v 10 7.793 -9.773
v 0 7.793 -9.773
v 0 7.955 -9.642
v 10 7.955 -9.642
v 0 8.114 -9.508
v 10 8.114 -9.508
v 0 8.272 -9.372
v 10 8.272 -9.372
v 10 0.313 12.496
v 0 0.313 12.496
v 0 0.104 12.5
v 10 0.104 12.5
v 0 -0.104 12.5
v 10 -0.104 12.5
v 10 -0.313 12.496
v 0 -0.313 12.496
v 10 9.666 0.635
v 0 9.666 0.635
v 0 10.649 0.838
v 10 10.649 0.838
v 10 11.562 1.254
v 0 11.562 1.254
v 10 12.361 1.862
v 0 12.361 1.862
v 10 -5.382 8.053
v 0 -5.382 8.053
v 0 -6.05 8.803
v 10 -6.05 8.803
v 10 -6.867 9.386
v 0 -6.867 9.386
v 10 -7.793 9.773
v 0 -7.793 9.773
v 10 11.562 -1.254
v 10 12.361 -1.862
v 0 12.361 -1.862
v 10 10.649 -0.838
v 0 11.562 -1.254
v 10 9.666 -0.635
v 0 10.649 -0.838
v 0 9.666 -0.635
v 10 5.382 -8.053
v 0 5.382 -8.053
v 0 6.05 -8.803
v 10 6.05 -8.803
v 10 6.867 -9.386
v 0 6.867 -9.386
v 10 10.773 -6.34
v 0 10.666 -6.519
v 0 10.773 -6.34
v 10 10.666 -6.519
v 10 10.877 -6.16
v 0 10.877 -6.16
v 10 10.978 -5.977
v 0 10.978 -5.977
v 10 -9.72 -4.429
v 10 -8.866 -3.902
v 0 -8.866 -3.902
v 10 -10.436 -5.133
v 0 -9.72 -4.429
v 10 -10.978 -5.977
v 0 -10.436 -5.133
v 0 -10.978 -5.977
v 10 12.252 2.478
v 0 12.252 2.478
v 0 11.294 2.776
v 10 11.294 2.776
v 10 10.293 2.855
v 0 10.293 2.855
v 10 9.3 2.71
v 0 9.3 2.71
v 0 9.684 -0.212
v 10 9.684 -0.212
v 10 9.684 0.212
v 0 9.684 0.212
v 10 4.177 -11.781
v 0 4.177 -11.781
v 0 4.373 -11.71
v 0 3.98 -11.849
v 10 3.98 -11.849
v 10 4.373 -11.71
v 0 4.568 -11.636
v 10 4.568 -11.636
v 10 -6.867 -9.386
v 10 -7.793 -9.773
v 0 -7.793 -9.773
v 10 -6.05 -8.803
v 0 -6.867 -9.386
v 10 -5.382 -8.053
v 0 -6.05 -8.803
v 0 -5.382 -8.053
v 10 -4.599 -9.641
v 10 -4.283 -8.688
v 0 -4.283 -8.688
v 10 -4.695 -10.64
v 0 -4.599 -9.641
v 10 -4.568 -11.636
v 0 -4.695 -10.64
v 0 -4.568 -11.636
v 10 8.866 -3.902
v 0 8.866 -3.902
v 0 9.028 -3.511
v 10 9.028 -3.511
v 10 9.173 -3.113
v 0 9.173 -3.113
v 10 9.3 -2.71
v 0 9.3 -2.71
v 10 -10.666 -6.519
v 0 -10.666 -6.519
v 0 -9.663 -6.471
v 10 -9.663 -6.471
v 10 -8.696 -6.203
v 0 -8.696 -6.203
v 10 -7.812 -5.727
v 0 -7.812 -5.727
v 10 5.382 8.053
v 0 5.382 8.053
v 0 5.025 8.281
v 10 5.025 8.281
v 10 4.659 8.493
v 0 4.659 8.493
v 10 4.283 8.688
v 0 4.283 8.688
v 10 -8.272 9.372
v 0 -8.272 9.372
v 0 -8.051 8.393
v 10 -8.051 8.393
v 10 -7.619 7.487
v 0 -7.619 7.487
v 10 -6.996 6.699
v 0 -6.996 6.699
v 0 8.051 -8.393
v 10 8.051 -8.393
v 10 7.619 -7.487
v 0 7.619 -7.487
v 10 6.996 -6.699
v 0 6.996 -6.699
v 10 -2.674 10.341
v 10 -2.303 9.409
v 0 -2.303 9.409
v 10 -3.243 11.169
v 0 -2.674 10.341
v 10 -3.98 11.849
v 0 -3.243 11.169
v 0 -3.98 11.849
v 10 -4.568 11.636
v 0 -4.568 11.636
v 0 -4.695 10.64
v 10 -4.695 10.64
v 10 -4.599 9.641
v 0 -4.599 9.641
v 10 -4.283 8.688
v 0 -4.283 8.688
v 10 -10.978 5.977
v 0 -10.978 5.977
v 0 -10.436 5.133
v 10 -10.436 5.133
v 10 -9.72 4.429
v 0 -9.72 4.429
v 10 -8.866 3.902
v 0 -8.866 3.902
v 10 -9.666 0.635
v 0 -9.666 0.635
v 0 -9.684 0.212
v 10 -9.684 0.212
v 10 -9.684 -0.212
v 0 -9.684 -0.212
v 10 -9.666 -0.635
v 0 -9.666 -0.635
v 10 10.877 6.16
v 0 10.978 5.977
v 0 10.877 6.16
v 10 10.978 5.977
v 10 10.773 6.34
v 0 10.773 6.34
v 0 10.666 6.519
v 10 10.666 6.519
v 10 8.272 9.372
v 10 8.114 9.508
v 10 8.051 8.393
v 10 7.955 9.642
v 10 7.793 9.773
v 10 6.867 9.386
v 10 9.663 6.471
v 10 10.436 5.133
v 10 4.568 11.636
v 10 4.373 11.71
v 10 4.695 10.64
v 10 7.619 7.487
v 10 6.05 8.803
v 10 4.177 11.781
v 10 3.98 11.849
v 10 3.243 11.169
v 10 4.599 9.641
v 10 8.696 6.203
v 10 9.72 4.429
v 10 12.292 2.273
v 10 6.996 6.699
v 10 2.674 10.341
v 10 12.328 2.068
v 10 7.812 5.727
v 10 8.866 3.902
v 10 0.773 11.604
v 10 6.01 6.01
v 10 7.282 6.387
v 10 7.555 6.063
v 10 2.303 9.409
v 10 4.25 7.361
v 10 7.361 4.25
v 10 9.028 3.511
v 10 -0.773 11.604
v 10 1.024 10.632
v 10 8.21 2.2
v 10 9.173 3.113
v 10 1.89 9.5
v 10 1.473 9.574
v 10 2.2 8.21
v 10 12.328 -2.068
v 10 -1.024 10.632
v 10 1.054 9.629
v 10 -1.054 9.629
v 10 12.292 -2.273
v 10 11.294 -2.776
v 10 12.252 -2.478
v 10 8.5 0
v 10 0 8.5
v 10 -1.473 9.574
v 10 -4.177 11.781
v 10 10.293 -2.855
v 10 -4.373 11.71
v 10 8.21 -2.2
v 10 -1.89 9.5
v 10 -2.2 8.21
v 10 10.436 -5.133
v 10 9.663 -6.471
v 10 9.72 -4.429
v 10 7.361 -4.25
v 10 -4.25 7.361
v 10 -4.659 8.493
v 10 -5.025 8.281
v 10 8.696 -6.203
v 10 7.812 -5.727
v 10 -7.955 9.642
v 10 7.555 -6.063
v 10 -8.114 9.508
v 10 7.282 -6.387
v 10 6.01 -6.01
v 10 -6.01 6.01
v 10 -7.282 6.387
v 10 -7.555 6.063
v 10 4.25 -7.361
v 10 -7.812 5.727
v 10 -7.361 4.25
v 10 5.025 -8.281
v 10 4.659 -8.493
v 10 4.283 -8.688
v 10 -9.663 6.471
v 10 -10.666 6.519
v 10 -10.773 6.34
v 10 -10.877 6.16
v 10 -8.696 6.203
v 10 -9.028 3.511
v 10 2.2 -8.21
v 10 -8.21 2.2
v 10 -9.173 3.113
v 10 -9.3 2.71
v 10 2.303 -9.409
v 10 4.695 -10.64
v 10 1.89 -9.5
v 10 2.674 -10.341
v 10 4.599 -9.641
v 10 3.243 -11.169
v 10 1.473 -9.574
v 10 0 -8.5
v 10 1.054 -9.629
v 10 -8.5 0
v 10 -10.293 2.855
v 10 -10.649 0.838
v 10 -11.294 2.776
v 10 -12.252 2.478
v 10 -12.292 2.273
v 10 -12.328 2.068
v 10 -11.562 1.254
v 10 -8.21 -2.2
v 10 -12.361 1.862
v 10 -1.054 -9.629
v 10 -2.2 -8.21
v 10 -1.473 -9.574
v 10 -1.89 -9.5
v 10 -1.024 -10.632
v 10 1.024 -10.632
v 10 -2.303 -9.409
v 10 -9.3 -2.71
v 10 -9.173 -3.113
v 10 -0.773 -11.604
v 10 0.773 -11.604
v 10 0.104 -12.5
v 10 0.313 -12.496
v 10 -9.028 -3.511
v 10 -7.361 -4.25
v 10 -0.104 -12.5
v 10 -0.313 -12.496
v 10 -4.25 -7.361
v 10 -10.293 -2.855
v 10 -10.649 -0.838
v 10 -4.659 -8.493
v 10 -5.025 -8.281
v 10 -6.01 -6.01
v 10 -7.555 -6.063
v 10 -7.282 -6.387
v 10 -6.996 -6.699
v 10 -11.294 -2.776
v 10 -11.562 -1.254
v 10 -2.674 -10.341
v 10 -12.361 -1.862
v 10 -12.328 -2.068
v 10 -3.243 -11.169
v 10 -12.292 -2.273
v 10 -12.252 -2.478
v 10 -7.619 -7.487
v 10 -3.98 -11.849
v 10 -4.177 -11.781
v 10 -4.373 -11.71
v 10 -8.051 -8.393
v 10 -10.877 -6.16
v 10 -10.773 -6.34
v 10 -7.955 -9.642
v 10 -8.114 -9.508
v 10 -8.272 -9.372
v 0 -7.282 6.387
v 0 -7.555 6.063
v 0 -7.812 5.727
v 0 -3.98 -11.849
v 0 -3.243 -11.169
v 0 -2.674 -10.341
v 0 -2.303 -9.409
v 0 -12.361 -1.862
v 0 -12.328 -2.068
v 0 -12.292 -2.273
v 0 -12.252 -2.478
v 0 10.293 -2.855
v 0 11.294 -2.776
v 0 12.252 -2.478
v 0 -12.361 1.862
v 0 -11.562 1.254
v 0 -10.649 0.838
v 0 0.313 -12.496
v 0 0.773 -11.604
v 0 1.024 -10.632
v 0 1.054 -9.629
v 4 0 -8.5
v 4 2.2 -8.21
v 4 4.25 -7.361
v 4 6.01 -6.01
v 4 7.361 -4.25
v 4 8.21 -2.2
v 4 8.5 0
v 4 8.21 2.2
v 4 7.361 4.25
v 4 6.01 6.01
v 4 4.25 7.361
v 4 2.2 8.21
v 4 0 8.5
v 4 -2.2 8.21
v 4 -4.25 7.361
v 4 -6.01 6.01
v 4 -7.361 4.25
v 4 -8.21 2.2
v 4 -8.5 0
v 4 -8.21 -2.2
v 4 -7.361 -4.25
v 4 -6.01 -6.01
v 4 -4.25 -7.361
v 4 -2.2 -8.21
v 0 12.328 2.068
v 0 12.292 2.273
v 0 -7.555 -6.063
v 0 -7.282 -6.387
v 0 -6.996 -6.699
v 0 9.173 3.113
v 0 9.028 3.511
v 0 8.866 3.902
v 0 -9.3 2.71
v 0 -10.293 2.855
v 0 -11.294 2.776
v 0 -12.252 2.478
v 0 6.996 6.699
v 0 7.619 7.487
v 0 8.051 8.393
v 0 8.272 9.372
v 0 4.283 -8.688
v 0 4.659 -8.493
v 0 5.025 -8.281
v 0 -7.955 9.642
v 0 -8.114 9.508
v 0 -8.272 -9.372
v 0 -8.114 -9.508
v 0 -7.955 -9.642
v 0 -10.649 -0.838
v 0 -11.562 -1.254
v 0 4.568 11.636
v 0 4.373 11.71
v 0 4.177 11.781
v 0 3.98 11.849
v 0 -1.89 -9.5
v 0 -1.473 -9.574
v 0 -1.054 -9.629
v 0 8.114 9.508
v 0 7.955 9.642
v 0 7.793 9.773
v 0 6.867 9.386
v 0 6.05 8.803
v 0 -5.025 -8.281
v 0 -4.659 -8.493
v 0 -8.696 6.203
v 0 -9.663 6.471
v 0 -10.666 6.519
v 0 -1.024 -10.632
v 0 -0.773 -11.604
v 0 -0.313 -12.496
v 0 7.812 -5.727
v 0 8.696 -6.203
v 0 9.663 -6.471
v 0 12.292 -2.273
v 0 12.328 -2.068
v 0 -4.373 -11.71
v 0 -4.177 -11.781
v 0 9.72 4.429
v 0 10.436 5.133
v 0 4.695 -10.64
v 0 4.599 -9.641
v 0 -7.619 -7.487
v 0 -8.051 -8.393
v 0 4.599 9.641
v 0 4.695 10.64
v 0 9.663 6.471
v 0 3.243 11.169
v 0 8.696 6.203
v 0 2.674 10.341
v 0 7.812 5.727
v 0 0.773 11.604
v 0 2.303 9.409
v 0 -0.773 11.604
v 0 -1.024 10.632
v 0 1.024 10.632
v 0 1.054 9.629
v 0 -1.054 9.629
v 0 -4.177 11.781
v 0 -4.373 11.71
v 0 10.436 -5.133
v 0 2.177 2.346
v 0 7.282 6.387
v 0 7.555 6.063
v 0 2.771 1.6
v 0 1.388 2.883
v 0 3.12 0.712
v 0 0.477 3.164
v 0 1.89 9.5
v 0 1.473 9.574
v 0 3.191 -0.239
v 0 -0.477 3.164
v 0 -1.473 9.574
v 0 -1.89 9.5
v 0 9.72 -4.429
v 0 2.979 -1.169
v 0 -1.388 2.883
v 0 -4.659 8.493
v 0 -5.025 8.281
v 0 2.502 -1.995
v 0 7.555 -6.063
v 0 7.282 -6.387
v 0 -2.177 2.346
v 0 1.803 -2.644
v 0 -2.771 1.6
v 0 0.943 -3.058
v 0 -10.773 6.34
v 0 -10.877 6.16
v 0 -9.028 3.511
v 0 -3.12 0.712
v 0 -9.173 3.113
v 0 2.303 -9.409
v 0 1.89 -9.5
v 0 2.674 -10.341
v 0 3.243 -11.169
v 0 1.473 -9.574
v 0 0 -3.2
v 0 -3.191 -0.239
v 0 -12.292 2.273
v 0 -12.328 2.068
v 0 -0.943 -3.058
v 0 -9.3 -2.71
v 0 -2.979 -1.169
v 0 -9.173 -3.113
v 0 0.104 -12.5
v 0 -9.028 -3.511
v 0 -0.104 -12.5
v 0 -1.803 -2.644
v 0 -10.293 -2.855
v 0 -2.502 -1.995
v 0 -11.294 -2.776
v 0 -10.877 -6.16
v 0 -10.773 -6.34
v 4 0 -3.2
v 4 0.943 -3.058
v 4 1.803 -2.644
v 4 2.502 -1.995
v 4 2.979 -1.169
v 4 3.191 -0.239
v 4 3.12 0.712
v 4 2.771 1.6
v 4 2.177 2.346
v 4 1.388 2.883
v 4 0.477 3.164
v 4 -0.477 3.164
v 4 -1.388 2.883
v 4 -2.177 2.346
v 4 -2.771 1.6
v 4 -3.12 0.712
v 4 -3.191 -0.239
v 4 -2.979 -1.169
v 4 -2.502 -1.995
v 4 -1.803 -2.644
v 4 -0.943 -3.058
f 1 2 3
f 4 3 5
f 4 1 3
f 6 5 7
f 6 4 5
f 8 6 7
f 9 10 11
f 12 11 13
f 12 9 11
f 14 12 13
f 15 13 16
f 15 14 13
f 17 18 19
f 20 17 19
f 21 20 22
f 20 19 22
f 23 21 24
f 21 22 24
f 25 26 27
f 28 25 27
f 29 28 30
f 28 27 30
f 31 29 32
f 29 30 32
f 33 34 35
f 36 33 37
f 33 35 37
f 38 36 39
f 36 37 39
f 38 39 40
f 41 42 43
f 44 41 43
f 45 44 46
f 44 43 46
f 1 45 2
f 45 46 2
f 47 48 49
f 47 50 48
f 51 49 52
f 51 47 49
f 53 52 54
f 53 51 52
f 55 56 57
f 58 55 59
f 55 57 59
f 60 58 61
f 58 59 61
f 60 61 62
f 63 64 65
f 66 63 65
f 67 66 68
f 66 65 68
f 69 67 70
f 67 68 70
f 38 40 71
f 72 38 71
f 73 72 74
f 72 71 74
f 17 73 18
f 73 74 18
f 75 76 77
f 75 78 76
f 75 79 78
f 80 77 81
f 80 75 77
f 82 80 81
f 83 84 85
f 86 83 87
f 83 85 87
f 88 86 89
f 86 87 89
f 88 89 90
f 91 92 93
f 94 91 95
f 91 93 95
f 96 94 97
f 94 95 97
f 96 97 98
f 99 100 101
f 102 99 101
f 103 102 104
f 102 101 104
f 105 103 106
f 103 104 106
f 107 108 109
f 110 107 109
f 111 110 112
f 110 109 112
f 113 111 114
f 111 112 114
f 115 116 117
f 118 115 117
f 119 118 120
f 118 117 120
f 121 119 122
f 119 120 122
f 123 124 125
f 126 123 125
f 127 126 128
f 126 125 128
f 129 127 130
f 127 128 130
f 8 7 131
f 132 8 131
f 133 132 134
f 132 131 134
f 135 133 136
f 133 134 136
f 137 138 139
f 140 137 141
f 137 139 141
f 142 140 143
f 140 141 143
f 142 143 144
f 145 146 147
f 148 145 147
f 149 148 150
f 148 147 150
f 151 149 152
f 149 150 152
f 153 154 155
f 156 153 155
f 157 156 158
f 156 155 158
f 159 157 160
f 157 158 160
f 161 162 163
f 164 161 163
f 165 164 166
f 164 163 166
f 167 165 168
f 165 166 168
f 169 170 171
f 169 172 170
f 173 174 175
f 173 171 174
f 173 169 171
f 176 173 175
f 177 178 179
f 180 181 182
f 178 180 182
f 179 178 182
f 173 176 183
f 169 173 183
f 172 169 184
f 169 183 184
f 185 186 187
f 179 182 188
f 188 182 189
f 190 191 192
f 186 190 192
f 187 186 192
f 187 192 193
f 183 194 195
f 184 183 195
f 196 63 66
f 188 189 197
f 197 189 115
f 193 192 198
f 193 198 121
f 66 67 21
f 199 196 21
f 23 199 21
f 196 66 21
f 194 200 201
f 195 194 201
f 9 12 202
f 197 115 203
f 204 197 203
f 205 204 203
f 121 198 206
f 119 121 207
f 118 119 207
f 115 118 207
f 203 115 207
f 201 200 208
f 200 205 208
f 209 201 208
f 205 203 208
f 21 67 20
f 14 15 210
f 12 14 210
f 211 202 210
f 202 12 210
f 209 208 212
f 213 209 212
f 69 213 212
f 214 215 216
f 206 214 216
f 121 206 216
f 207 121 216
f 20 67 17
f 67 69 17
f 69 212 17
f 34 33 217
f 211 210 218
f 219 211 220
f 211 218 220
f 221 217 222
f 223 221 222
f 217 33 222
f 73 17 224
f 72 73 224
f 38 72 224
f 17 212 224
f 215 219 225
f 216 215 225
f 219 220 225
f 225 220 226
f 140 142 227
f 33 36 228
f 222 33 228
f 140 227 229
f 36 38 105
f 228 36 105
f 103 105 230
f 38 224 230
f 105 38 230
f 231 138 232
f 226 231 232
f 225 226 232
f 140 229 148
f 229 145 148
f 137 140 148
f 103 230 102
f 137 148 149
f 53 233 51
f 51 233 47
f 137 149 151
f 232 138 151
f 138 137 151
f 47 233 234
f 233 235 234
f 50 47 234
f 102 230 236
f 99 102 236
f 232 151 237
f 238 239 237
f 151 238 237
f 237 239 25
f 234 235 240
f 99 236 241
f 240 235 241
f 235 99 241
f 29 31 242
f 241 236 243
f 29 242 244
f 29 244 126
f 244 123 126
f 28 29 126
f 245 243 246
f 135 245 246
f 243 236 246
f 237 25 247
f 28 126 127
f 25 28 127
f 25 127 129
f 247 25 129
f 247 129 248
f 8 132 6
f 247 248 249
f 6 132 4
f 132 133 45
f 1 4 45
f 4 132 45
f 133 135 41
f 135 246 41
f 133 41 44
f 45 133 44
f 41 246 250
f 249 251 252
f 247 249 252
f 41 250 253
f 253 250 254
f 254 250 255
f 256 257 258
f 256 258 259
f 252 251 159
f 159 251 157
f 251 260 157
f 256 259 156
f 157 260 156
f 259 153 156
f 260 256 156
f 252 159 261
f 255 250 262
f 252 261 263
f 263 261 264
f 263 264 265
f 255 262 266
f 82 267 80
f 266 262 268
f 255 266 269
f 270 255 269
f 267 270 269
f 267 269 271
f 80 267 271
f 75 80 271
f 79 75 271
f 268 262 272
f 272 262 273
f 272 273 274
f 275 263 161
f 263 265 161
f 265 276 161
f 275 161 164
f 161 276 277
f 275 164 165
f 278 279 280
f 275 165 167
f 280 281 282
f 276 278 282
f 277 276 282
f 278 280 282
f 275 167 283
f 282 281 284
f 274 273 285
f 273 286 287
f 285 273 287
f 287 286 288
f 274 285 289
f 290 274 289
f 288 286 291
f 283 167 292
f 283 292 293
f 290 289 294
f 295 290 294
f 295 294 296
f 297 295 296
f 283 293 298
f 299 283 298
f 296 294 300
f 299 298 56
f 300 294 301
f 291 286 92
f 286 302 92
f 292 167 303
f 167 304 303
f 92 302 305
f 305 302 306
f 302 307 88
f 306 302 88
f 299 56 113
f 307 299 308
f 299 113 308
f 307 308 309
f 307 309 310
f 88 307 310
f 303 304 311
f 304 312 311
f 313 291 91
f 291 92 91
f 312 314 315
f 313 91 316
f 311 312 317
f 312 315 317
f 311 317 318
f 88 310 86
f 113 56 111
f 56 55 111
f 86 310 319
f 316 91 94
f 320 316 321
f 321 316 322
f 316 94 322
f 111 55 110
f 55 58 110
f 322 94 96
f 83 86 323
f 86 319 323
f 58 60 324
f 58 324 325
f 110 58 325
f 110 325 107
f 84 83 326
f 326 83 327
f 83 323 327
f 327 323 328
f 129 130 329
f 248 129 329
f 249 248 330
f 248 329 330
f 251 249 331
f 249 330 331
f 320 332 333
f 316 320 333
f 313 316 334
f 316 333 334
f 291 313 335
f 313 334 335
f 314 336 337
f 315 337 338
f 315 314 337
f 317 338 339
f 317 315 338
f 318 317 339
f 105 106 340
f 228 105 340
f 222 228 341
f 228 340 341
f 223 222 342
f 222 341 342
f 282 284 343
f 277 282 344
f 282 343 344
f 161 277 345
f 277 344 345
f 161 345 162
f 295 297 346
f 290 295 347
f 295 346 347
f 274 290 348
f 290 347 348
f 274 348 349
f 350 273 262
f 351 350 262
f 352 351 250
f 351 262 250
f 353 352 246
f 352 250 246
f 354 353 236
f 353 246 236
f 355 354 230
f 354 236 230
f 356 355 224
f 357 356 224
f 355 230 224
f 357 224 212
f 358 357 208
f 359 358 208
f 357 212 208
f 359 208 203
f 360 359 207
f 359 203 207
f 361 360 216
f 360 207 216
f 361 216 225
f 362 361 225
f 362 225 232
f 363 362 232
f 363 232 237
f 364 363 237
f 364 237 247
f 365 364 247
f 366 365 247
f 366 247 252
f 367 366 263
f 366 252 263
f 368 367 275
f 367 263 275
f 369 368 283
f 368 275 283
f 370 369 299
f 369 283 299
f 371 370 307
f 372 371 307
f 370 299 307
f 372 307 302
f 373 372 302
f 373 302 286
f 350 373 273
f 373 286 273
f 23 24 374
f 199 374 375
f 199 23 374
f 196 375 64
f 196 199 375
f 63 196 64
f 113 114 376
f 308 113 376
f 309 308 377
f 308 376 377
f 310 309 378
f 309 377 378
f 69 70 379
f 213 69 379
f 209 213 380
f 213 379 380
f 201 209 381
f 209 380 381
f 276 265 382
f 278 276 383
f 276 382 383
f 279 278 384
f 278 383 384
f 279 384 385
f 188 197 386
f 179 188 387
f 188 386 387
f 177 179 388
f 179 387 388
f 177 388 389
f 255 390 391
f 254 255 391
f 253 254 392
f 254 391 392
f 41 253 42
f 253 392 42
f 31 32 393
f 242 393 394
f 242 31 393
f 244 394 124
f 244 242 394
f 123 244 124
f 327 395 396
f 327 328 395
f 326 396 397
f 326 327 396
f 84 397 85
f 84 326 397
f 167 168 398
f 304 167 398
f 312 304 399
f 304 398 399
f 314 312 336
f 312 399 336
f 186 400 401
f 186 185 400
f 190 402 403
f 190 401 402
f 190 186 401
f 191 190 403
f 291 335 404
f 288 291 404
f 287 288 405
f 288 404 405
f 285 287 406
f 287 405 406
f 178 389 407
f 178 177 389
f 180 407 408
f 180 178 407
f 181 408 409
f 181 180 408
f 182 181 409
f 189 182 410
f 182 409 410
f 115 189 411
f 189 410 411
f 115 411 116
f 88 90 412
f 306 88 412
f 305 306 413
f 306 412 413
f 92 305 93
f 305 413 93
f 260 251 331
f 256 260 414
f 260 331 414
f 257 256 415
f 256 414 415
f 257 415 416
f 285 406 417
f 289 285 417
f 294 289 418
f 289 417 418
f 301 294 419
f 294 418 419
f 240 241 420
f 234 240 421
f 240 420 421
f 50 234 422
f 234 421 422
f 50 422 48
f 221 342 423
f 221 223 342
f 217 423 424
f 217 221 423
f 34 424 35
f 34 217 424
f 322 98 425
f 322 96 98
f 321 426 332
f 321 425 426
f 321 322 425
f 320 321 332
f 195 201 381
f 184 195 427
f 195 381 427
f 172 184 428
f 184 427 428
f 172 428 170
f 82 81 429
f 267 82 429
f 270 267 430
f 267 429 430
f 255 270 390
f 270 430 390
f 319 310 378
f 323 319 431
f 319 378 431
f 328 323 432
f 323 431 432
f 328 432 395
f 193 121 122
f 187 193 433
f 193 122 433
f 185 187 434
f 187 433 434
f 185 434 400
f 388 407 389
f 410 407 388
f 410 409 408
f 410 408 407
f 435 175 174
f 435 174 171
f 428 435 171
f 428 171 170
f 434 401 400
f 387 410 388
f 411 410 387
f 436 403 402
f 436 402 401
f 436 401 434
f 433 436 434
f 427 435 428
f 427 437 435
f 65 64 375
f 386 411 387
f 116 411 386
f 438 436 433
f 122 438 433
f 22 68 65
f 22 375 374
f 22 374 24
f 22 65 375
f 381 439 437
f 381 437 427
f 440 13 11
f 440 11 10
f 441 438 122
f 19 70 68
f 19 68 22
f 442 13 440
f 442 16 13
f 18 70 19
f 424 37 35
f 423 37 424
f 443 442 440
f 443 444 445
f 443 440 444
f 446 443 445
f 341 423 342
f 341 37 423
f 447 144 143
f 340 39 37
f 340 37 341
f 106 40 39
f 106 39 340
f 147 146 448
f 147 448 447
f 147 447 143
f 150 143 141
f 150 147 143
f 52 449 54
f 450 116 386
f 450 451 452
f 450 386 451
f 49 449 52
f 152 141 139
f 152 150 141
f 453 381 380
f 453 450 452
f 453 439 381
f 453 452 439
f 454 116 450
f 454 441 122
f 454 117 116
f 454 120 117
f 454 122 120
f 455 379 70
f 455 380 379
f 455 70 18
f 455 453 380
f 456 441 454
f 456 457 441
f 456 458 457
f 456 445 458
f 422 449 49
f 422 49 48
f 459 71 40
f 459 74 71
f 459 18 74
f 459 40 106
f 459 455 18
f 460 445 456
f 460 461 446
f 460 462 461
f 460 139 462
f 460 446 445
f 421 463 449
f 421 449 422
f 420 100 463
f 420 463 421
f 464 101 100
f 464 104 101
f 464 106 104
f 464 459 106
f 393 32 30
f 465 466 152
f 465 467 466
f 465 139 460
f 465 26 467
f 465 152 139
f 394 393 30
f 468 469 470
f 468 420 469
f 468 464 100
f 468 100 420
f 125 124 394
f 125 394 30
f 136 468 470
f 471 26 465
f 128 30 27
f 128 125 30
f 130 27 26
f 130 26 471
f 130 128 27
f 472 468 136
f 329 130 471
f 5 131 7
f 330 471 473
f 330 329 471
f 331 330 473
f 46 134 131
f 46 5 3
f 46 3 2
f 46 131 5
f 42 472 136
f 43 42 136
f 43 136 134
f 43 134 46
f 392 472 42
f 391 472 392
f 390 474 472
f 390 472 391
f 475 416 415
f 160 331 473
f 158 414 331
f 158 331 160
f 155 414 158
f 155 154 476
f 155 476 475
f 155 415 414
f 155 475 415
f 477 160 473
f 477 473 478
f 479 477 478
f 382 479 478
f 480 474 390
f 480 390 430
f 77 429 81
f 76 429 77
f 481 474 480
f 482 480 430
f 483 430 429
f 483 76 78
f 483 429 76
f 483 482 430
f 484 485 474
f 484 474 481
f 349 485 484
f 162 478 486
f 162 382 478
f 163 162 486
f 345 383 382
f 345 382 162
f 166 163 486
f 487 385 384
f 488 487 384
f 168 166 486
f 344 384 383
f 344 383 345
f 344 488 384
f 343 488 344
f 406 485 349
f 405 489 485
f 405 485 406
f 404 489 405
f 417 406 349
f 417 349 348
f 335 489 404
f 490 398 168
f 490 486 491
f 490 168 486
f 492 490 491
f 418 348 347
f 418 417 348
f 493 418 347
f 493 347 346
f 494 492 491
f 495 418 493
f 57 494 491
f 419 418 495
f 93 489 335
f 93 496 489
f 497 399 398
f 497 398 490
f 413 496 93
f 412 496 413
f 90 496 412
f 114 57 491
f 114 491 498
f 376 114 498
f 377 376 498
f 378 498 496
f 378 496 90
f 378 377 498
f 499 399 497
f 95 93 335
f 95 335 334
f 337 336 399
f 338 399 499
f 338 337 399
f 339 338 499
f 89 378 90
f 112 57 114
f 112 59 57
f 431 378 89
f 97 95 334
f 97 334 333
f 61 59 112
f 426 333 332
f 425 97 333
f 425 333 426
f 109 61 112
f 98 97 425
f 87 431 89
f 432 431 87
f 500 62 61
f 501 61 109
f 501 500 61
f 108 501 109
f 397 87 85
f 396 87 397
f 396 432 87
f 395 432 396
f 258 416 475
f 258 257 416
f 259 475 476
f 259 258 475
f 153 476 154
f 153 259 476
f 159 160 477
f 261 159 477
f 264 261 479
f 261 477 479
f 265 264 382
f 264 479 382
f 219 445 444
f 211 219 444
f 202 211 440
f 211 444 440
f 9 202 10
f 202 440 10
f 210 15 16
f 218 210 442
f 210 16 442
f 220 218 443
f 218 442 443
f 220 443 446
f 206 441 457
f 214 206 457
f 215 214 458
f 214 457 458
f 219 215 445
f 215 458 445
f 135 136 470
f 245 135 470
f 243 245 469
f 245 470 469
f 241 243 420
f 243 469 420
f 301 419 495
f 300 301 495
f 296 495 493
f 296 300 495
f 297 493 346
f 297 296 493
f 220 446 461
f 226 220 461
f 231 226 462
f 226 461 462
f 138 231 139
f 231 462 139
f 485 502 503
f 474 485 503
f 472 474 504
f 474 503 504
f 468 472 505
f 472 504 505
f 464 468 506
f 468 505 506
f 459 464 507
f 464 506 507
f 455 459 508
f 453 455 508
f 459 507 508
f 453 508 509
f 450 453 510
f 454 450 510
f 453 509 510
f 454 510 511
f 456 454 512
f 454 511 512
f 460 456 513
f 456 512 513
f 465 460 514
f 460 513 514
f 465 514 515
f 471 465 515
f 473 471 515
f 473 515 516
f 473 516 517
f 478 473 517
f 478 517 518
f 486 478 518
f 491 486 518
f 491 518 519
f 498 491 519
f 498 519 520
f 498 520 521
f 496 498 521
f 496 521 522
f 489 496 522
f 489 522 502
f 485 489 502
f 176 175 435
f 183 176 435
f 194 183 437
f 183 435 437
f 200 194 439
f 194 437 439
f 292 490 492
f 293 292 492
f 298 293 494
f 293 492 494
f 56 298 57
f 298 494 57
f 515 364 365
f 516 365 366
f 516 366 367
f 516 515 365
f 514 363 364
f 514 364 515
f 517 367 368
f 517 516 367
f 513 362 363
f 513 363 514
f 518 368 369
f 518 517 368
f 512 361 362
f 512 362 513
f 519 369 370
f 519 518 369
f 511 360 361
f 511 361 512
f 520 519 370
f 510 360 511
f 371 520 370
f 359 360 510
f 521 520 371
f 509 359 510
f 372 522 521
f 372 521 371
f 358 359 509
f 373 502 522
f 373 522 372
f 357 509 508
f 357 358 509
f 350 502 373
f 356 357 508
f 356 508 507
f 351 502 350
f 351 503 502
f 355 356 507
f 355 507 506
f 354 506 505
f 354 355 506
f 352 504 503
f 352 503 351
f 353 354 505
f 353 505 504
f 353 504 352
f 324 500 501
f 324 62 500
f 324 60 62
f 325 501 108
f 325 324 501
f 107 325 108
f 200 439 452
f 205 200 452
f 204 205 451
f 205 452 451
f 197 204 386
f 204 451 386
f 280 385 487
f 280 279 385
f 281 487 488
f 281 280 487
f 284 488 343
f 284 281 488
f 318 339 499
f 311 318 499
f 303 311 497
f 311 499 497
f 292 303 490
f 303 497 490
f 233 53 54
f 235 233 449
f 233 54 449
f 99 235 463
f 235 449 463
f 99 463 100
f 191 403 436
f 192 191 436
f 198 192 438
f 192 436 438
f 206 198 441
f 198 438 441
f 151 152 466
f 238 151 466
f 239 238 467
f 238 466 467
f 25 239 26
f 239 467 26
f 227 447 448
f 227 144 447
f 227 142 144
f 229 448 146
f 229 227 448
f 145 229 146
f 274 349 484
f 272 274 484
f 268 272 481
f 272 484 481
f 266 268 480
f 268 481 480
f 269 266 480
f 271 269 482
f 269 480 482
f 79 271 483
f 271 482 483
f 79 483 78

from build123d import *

# Parameters (mm, degrees)
BASPROSKE_W        = 10
BASPROSKE_H        = 12.5
TOOTHCUT_DEPTH     = 21.310096012
TEETHCUTS_COUNT    = 18
TEETHCUTS_ANGLE    = 340
BORSKE_R           = 1.5
BORE_DEPTH         = 50.0000508
SKETCH1_R          = 8.5
CUT_EXTRUDE1_DEPTH = 6
SKETCH2_R          = 3.2
CUT_EXTRUDE2_DEPTH = 19.575045867


with BuildPart() as part:
    # BasProSke → Base-Revolve (revolve)
    with BuildSketch(Plane(origin=(0, 0, 0), x_dir=(1, 0, 0), z_dir=(0, 1, 0)), mode=Mode.PRIVATE) as base_revolve_sk:
        with Locations((5, 6.25)):
            Rectangle(BASPROSKE_W, BASPROSKE_H)
    revolve(base_revolve_sk.sketch.rotate(Axis((-10, 0, 0), (1, 0, 0)), 180), axis=Axis((-10, 0, 0), (1, 0, 0)))

    # TooCutSke → ToothCut (cut, through all)
    with BuildSketch(Plane(origin=(0, 0, 0), x_dir=(0, 0, -1), z_dir=(1, 0, 0))):
        with BuildLine():
            ThreePointArc((0.634554124, 9.665693111), (0, 9.6865), (-0.634554124, 9.665693111))
            ThreePointArc((-0.634554124, 9.665693111), (-1.026818848, 11.131124412), (-1.883745888, 12.38293772))
            ThreePointArc((-1.883745888, 12.38293772), (0, 12.5254), (1.883745888, 12.38293772))
            ThreePointArc((1.883745888, 12.38293772), (1.026818848, 11.131124412), (0.634554124, 9.665693111))
        make_face()
    toothcut = extrude(amount=TOOTHCUT_DEPTH, mode=Mode.SUBTRACT)

    # TeethCuts: ToothCut ×18 about axis
    teethcuts_axis = Axis((-10, 0, 0), (1, 0, 0))
    for i in range(1, TEETHCUTS_COUNT):
        add(toothcut.rotate(teethcuts_axis, i * TEETHCUTS_ANGLE / (TEETHCUTS_COUNT - 1)), mode=Mode.SUBTRACT)

    # BorSke → Bore (cut, symmetric)
    with BuildSketch(Plane(origin=(0, 0, 0), x_dir=(0, 0, -1), z_dir=(1, 0, 0))):
        with Locations(Location((0, 0, 0), (0, 0, 180))):
            Circle(BORSKE_R)
    extrude(amount=BORE_DEPTH, both=True, mode=Mode.SUBTRACT)

    # Sketch1 → Cut-Extrude1 (cut)
    with BuildSketch(Plane(origin=(10, 0, 0), x_dir=(0, 0, -1), z_dir=(1, 0, 0))):
        Circle(SKETCH1_R)
    extrude(amount=-CUT_EXTRUDE1_DEPTH, mode=Mode.SUBTRACT)

    # Sketch2 → Cut-Extrude2 (cut, through all)
    with BuildSketch(Plane(origin=(4, 0, 0), x_dir=(0, 0, -1), z_dir=(1, 0, 0))):
        Circle(SKETCH2_R)
    extrude(amount=-CUT_EXTRUDE2_DEPTH, mode=Mode.SUBTRACT)


solid = part.part
